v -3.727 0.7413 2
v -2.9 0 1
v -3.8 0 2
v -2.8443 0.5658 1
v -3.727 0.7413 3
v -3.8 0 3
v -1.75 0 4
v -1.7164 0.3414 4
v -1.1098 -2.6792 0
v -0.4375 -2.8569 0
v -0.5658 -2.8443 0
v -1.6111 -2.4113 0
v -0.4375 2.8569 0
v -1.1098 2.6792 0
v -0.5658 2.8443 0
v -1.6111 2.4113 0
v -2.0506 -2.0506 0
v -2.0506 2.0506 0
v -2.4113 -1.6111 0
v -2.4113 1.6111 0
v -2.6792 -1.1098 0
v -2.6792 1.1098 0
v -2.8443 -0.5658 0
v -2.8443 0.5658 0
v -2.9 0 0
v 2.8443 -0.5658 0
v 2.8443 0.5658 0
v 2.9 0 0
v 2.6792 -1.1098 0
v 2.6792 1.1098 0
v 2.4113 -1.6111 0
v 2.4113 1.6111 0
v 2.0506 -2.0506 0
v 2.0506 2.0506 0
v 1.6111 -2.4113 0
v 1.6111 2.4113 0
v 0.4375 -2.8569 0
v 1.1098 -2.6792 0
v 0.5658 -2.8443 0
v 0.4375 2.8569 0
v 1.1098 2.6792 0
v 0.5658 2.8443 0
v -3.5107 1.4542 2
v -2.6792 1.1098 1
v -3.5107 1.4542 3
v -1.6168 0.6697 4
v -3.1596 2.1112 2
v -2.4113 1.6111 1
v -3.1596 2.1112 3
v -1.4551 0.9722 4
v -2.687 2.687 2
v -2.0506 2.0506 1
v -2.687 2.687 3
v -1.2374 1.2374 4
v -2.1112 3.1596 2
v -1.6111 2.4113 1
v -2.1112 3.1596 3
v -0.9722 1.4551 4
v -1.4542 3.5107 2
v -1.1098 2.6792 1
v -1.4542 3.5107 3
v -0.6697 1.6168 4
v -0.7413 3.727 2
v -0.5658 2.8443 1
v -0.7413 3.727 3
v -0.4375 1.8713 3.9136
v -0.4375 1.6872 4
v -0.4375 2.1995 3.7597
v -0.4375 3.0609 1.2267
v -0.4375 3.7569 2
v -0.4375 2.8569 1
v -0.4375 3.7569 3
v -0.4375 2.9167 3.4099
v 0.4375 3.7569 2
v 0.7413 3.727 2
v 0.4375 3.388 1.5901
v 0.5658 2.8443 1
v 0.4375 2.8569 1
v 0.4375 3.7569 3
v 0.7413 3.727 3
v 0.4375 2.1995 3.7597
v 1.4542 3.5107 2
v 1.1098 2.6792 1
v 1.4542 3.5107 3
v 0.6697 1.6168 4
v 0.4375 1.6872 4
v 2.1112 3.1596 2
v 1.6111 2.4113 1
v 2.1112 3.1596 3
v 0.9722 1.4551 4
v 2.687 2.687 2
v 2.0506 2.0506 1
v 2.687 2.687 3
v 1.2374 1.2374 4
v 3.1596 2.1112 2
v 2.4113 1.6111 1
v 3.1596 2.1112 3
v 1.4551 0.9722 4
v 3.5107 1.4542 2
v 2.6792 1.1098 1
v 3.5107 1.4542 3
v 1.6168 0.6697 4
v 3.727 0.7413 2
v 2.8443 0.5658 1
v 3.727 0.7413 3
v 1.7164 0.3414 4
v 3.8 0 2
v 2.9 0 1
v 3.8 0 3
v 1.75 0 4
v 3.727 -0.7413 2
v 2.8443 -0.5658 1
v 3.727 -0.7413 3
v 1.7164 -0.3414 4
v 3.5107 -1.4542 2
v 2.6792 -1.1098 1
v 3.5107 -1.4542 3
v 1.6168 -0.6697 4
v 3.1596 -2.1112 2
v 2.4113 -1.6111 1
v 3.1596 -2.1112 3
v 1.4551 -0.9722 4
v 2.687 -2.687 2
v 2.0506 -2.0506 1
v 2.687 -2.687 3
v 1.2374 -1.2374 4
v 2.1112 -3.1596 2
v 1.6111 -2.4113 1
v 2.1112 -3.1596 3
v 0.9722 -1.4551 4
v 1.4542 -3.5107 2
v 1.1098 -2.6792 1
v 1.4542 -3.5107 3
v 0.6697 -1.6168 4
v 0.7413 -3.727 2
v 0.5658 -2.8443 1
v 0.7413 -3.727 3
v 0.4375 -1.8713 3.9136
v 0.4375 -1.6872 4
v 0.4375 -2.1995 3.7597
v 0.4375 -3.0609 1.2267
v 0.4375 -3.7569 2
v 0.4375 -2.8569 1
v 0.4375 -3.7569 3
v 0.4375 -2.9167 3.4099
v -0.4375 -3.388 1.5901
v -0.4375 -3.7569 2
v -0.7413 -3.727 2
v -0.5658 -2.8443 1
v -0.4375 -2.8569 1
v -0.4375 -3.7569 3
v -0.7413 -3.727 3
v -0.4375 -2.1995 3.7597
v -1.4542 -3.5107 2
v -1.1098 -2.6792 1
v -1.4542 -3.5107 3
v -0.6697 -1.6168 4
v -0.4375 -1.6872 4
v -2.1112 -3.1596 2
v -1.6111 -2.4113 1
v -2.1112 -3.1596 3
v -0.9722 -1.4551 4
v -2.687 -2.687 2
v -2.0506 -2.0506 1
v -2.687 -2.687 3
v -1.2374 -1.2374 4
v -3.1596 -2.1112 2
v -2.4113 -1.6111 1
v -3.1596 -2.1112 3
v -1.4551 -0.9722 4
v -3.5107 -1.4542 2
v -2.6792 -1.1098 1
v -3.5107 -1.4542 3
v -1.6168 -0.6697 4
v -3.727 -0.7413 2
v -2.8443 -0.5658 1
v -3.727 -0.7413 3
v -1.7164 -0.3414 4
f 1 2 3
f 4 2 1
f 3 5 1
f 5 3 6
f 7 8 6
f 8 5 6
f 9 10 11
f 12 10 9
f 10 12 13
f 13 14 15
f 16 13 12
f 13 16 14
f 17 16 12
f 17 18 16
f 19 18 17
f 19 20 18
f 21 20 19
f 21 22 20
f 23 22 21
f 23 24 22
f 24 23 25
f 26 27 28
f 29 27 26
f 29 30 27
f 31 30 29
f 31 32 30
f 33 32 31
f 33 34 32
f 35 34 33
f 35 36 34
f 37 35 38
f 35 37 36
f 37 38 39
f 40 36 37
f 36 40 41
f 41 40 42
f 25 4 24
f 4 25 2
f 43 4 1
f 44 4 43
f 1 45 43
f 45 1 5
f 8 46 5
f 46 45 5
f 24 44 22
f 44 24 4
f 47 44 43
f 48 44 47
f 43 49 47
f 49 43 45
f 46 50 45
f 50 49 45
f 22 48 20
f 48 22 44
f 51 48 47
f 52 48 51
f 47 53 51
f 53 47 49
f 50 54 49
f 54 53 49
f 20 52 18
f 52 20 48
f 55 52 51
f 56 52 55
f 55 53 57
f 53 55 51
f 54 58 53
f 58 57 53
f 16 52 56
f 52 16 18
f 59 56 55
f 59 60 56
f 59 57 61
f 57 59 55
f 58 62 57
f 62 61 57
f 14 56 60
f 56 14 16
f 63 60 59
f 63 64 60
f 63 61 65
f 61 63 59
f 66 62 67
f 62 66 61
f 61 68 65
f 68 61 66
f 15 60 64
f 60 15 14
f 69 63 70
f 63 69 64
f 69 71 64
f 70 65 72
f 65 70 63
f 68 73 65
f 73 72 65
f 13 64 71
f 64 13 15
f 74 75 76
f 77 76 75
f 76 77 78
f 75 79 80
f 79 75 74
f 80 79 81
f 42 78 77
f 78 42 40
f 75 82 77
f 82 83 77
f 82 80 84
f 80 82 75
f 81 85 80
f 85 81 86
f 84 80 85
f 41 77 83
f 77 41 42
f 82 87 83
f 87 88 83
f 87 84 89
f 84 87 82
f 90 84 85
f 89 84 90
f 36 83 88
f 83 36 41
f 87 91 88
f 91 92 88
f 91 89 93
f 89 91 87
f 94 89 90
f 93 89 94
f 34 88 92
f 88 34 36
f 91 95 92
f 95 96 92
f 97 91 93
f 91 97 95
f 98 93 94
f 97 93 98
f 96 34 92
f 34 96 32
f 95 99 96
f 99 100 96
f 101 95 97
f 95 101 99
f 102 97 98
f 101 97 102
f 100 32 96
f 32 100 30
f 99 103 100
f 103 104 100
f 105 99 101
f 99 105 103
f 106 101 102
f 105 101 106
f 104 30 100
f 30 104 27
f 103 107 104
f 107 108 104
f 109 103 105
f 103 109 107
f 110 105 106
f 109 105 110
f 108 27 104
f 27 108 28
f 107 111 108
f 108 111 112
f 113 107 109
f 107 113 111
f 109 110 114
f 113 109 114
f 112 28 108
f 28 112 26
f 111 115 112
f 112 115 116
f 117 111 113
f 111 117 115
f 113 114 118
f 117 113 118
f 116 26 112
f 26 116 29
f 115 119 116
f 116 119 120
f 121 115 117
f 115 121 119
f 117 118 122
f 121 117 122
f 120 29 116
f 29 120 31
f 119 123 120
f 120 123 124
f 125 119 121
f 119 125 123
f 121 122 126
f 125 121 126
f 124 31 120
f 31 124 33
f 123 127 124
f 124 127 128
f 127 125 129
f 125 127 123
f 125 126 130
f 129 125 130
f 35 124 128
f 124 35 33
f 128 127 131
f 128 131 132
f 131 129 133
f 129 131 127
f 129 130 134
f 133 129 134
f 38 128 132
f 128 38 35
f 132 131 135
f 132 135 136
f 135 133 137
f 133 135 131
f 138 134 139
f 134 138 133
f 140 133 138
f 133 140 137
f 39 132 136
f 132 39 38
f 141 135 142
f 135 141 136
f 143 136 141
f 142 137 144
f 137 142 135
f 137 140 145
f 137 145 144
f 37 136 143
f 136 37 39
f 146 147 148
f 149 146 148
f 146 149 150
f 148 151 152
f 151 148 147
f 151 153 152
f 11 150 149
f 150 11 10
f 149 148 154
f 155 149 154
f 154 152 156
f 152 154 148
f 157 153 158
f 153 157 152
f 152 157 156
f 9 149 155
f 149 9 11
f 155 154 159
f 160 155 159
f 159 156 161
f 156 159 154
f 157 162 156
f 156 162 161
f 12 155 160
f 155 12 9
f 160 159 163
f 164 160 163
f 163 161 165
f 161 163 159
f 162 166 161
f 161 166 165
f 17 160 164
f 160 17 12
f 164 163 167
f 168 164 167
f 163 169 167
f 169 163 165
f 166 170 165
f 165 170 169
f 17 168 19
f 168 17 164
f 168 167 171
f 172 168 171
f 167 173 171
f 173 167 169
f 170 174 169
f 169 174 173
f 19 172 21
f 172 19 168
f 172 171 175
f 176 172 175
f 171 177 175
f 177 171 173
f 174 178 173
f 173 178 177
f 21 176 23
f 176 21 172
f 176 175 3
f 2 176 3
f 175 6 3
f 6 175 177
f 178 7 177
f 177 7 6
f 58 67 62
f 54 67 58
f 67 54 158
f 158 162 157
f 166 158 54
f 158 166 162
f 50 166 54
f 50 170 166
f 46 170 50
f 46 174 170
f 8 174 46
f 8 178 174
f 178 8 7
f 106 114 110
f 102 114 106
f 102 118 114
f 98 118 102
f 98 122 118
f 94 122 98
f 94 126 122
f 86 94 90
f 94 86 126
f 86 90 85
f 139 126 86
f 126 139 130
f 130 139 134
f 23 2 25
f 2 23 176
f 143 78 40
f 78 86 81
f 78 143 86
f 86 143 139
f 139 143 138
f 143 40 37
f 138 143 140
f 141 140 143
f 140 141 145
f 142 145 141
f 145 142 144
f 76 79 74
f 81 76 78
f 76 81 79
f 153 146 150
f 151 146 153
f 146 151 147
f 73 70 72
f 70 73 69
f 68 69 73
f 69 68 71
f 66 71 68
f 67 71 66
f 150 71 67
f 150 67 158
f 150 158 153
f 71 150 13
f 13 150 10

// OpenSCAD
module plug(r=3.5, gap=0.3){
	
	cut = r/4;
	len = 100;
	
	difference(){
	    rotate_extrude(angle=360, $fn=32){
		    polygon([
				[0,0],
				[r-2*gap,0],
				[r-2*gap,1],
				[r+gap,2],
				[r+gap,3],
				[r/2,4],
				[0,4]
			]);
		}
		
		translate([-cut/2,-len/2,-len/2]){
			cube([cut,len,len],center=false);
		}
		
	}
	
}

plug();
